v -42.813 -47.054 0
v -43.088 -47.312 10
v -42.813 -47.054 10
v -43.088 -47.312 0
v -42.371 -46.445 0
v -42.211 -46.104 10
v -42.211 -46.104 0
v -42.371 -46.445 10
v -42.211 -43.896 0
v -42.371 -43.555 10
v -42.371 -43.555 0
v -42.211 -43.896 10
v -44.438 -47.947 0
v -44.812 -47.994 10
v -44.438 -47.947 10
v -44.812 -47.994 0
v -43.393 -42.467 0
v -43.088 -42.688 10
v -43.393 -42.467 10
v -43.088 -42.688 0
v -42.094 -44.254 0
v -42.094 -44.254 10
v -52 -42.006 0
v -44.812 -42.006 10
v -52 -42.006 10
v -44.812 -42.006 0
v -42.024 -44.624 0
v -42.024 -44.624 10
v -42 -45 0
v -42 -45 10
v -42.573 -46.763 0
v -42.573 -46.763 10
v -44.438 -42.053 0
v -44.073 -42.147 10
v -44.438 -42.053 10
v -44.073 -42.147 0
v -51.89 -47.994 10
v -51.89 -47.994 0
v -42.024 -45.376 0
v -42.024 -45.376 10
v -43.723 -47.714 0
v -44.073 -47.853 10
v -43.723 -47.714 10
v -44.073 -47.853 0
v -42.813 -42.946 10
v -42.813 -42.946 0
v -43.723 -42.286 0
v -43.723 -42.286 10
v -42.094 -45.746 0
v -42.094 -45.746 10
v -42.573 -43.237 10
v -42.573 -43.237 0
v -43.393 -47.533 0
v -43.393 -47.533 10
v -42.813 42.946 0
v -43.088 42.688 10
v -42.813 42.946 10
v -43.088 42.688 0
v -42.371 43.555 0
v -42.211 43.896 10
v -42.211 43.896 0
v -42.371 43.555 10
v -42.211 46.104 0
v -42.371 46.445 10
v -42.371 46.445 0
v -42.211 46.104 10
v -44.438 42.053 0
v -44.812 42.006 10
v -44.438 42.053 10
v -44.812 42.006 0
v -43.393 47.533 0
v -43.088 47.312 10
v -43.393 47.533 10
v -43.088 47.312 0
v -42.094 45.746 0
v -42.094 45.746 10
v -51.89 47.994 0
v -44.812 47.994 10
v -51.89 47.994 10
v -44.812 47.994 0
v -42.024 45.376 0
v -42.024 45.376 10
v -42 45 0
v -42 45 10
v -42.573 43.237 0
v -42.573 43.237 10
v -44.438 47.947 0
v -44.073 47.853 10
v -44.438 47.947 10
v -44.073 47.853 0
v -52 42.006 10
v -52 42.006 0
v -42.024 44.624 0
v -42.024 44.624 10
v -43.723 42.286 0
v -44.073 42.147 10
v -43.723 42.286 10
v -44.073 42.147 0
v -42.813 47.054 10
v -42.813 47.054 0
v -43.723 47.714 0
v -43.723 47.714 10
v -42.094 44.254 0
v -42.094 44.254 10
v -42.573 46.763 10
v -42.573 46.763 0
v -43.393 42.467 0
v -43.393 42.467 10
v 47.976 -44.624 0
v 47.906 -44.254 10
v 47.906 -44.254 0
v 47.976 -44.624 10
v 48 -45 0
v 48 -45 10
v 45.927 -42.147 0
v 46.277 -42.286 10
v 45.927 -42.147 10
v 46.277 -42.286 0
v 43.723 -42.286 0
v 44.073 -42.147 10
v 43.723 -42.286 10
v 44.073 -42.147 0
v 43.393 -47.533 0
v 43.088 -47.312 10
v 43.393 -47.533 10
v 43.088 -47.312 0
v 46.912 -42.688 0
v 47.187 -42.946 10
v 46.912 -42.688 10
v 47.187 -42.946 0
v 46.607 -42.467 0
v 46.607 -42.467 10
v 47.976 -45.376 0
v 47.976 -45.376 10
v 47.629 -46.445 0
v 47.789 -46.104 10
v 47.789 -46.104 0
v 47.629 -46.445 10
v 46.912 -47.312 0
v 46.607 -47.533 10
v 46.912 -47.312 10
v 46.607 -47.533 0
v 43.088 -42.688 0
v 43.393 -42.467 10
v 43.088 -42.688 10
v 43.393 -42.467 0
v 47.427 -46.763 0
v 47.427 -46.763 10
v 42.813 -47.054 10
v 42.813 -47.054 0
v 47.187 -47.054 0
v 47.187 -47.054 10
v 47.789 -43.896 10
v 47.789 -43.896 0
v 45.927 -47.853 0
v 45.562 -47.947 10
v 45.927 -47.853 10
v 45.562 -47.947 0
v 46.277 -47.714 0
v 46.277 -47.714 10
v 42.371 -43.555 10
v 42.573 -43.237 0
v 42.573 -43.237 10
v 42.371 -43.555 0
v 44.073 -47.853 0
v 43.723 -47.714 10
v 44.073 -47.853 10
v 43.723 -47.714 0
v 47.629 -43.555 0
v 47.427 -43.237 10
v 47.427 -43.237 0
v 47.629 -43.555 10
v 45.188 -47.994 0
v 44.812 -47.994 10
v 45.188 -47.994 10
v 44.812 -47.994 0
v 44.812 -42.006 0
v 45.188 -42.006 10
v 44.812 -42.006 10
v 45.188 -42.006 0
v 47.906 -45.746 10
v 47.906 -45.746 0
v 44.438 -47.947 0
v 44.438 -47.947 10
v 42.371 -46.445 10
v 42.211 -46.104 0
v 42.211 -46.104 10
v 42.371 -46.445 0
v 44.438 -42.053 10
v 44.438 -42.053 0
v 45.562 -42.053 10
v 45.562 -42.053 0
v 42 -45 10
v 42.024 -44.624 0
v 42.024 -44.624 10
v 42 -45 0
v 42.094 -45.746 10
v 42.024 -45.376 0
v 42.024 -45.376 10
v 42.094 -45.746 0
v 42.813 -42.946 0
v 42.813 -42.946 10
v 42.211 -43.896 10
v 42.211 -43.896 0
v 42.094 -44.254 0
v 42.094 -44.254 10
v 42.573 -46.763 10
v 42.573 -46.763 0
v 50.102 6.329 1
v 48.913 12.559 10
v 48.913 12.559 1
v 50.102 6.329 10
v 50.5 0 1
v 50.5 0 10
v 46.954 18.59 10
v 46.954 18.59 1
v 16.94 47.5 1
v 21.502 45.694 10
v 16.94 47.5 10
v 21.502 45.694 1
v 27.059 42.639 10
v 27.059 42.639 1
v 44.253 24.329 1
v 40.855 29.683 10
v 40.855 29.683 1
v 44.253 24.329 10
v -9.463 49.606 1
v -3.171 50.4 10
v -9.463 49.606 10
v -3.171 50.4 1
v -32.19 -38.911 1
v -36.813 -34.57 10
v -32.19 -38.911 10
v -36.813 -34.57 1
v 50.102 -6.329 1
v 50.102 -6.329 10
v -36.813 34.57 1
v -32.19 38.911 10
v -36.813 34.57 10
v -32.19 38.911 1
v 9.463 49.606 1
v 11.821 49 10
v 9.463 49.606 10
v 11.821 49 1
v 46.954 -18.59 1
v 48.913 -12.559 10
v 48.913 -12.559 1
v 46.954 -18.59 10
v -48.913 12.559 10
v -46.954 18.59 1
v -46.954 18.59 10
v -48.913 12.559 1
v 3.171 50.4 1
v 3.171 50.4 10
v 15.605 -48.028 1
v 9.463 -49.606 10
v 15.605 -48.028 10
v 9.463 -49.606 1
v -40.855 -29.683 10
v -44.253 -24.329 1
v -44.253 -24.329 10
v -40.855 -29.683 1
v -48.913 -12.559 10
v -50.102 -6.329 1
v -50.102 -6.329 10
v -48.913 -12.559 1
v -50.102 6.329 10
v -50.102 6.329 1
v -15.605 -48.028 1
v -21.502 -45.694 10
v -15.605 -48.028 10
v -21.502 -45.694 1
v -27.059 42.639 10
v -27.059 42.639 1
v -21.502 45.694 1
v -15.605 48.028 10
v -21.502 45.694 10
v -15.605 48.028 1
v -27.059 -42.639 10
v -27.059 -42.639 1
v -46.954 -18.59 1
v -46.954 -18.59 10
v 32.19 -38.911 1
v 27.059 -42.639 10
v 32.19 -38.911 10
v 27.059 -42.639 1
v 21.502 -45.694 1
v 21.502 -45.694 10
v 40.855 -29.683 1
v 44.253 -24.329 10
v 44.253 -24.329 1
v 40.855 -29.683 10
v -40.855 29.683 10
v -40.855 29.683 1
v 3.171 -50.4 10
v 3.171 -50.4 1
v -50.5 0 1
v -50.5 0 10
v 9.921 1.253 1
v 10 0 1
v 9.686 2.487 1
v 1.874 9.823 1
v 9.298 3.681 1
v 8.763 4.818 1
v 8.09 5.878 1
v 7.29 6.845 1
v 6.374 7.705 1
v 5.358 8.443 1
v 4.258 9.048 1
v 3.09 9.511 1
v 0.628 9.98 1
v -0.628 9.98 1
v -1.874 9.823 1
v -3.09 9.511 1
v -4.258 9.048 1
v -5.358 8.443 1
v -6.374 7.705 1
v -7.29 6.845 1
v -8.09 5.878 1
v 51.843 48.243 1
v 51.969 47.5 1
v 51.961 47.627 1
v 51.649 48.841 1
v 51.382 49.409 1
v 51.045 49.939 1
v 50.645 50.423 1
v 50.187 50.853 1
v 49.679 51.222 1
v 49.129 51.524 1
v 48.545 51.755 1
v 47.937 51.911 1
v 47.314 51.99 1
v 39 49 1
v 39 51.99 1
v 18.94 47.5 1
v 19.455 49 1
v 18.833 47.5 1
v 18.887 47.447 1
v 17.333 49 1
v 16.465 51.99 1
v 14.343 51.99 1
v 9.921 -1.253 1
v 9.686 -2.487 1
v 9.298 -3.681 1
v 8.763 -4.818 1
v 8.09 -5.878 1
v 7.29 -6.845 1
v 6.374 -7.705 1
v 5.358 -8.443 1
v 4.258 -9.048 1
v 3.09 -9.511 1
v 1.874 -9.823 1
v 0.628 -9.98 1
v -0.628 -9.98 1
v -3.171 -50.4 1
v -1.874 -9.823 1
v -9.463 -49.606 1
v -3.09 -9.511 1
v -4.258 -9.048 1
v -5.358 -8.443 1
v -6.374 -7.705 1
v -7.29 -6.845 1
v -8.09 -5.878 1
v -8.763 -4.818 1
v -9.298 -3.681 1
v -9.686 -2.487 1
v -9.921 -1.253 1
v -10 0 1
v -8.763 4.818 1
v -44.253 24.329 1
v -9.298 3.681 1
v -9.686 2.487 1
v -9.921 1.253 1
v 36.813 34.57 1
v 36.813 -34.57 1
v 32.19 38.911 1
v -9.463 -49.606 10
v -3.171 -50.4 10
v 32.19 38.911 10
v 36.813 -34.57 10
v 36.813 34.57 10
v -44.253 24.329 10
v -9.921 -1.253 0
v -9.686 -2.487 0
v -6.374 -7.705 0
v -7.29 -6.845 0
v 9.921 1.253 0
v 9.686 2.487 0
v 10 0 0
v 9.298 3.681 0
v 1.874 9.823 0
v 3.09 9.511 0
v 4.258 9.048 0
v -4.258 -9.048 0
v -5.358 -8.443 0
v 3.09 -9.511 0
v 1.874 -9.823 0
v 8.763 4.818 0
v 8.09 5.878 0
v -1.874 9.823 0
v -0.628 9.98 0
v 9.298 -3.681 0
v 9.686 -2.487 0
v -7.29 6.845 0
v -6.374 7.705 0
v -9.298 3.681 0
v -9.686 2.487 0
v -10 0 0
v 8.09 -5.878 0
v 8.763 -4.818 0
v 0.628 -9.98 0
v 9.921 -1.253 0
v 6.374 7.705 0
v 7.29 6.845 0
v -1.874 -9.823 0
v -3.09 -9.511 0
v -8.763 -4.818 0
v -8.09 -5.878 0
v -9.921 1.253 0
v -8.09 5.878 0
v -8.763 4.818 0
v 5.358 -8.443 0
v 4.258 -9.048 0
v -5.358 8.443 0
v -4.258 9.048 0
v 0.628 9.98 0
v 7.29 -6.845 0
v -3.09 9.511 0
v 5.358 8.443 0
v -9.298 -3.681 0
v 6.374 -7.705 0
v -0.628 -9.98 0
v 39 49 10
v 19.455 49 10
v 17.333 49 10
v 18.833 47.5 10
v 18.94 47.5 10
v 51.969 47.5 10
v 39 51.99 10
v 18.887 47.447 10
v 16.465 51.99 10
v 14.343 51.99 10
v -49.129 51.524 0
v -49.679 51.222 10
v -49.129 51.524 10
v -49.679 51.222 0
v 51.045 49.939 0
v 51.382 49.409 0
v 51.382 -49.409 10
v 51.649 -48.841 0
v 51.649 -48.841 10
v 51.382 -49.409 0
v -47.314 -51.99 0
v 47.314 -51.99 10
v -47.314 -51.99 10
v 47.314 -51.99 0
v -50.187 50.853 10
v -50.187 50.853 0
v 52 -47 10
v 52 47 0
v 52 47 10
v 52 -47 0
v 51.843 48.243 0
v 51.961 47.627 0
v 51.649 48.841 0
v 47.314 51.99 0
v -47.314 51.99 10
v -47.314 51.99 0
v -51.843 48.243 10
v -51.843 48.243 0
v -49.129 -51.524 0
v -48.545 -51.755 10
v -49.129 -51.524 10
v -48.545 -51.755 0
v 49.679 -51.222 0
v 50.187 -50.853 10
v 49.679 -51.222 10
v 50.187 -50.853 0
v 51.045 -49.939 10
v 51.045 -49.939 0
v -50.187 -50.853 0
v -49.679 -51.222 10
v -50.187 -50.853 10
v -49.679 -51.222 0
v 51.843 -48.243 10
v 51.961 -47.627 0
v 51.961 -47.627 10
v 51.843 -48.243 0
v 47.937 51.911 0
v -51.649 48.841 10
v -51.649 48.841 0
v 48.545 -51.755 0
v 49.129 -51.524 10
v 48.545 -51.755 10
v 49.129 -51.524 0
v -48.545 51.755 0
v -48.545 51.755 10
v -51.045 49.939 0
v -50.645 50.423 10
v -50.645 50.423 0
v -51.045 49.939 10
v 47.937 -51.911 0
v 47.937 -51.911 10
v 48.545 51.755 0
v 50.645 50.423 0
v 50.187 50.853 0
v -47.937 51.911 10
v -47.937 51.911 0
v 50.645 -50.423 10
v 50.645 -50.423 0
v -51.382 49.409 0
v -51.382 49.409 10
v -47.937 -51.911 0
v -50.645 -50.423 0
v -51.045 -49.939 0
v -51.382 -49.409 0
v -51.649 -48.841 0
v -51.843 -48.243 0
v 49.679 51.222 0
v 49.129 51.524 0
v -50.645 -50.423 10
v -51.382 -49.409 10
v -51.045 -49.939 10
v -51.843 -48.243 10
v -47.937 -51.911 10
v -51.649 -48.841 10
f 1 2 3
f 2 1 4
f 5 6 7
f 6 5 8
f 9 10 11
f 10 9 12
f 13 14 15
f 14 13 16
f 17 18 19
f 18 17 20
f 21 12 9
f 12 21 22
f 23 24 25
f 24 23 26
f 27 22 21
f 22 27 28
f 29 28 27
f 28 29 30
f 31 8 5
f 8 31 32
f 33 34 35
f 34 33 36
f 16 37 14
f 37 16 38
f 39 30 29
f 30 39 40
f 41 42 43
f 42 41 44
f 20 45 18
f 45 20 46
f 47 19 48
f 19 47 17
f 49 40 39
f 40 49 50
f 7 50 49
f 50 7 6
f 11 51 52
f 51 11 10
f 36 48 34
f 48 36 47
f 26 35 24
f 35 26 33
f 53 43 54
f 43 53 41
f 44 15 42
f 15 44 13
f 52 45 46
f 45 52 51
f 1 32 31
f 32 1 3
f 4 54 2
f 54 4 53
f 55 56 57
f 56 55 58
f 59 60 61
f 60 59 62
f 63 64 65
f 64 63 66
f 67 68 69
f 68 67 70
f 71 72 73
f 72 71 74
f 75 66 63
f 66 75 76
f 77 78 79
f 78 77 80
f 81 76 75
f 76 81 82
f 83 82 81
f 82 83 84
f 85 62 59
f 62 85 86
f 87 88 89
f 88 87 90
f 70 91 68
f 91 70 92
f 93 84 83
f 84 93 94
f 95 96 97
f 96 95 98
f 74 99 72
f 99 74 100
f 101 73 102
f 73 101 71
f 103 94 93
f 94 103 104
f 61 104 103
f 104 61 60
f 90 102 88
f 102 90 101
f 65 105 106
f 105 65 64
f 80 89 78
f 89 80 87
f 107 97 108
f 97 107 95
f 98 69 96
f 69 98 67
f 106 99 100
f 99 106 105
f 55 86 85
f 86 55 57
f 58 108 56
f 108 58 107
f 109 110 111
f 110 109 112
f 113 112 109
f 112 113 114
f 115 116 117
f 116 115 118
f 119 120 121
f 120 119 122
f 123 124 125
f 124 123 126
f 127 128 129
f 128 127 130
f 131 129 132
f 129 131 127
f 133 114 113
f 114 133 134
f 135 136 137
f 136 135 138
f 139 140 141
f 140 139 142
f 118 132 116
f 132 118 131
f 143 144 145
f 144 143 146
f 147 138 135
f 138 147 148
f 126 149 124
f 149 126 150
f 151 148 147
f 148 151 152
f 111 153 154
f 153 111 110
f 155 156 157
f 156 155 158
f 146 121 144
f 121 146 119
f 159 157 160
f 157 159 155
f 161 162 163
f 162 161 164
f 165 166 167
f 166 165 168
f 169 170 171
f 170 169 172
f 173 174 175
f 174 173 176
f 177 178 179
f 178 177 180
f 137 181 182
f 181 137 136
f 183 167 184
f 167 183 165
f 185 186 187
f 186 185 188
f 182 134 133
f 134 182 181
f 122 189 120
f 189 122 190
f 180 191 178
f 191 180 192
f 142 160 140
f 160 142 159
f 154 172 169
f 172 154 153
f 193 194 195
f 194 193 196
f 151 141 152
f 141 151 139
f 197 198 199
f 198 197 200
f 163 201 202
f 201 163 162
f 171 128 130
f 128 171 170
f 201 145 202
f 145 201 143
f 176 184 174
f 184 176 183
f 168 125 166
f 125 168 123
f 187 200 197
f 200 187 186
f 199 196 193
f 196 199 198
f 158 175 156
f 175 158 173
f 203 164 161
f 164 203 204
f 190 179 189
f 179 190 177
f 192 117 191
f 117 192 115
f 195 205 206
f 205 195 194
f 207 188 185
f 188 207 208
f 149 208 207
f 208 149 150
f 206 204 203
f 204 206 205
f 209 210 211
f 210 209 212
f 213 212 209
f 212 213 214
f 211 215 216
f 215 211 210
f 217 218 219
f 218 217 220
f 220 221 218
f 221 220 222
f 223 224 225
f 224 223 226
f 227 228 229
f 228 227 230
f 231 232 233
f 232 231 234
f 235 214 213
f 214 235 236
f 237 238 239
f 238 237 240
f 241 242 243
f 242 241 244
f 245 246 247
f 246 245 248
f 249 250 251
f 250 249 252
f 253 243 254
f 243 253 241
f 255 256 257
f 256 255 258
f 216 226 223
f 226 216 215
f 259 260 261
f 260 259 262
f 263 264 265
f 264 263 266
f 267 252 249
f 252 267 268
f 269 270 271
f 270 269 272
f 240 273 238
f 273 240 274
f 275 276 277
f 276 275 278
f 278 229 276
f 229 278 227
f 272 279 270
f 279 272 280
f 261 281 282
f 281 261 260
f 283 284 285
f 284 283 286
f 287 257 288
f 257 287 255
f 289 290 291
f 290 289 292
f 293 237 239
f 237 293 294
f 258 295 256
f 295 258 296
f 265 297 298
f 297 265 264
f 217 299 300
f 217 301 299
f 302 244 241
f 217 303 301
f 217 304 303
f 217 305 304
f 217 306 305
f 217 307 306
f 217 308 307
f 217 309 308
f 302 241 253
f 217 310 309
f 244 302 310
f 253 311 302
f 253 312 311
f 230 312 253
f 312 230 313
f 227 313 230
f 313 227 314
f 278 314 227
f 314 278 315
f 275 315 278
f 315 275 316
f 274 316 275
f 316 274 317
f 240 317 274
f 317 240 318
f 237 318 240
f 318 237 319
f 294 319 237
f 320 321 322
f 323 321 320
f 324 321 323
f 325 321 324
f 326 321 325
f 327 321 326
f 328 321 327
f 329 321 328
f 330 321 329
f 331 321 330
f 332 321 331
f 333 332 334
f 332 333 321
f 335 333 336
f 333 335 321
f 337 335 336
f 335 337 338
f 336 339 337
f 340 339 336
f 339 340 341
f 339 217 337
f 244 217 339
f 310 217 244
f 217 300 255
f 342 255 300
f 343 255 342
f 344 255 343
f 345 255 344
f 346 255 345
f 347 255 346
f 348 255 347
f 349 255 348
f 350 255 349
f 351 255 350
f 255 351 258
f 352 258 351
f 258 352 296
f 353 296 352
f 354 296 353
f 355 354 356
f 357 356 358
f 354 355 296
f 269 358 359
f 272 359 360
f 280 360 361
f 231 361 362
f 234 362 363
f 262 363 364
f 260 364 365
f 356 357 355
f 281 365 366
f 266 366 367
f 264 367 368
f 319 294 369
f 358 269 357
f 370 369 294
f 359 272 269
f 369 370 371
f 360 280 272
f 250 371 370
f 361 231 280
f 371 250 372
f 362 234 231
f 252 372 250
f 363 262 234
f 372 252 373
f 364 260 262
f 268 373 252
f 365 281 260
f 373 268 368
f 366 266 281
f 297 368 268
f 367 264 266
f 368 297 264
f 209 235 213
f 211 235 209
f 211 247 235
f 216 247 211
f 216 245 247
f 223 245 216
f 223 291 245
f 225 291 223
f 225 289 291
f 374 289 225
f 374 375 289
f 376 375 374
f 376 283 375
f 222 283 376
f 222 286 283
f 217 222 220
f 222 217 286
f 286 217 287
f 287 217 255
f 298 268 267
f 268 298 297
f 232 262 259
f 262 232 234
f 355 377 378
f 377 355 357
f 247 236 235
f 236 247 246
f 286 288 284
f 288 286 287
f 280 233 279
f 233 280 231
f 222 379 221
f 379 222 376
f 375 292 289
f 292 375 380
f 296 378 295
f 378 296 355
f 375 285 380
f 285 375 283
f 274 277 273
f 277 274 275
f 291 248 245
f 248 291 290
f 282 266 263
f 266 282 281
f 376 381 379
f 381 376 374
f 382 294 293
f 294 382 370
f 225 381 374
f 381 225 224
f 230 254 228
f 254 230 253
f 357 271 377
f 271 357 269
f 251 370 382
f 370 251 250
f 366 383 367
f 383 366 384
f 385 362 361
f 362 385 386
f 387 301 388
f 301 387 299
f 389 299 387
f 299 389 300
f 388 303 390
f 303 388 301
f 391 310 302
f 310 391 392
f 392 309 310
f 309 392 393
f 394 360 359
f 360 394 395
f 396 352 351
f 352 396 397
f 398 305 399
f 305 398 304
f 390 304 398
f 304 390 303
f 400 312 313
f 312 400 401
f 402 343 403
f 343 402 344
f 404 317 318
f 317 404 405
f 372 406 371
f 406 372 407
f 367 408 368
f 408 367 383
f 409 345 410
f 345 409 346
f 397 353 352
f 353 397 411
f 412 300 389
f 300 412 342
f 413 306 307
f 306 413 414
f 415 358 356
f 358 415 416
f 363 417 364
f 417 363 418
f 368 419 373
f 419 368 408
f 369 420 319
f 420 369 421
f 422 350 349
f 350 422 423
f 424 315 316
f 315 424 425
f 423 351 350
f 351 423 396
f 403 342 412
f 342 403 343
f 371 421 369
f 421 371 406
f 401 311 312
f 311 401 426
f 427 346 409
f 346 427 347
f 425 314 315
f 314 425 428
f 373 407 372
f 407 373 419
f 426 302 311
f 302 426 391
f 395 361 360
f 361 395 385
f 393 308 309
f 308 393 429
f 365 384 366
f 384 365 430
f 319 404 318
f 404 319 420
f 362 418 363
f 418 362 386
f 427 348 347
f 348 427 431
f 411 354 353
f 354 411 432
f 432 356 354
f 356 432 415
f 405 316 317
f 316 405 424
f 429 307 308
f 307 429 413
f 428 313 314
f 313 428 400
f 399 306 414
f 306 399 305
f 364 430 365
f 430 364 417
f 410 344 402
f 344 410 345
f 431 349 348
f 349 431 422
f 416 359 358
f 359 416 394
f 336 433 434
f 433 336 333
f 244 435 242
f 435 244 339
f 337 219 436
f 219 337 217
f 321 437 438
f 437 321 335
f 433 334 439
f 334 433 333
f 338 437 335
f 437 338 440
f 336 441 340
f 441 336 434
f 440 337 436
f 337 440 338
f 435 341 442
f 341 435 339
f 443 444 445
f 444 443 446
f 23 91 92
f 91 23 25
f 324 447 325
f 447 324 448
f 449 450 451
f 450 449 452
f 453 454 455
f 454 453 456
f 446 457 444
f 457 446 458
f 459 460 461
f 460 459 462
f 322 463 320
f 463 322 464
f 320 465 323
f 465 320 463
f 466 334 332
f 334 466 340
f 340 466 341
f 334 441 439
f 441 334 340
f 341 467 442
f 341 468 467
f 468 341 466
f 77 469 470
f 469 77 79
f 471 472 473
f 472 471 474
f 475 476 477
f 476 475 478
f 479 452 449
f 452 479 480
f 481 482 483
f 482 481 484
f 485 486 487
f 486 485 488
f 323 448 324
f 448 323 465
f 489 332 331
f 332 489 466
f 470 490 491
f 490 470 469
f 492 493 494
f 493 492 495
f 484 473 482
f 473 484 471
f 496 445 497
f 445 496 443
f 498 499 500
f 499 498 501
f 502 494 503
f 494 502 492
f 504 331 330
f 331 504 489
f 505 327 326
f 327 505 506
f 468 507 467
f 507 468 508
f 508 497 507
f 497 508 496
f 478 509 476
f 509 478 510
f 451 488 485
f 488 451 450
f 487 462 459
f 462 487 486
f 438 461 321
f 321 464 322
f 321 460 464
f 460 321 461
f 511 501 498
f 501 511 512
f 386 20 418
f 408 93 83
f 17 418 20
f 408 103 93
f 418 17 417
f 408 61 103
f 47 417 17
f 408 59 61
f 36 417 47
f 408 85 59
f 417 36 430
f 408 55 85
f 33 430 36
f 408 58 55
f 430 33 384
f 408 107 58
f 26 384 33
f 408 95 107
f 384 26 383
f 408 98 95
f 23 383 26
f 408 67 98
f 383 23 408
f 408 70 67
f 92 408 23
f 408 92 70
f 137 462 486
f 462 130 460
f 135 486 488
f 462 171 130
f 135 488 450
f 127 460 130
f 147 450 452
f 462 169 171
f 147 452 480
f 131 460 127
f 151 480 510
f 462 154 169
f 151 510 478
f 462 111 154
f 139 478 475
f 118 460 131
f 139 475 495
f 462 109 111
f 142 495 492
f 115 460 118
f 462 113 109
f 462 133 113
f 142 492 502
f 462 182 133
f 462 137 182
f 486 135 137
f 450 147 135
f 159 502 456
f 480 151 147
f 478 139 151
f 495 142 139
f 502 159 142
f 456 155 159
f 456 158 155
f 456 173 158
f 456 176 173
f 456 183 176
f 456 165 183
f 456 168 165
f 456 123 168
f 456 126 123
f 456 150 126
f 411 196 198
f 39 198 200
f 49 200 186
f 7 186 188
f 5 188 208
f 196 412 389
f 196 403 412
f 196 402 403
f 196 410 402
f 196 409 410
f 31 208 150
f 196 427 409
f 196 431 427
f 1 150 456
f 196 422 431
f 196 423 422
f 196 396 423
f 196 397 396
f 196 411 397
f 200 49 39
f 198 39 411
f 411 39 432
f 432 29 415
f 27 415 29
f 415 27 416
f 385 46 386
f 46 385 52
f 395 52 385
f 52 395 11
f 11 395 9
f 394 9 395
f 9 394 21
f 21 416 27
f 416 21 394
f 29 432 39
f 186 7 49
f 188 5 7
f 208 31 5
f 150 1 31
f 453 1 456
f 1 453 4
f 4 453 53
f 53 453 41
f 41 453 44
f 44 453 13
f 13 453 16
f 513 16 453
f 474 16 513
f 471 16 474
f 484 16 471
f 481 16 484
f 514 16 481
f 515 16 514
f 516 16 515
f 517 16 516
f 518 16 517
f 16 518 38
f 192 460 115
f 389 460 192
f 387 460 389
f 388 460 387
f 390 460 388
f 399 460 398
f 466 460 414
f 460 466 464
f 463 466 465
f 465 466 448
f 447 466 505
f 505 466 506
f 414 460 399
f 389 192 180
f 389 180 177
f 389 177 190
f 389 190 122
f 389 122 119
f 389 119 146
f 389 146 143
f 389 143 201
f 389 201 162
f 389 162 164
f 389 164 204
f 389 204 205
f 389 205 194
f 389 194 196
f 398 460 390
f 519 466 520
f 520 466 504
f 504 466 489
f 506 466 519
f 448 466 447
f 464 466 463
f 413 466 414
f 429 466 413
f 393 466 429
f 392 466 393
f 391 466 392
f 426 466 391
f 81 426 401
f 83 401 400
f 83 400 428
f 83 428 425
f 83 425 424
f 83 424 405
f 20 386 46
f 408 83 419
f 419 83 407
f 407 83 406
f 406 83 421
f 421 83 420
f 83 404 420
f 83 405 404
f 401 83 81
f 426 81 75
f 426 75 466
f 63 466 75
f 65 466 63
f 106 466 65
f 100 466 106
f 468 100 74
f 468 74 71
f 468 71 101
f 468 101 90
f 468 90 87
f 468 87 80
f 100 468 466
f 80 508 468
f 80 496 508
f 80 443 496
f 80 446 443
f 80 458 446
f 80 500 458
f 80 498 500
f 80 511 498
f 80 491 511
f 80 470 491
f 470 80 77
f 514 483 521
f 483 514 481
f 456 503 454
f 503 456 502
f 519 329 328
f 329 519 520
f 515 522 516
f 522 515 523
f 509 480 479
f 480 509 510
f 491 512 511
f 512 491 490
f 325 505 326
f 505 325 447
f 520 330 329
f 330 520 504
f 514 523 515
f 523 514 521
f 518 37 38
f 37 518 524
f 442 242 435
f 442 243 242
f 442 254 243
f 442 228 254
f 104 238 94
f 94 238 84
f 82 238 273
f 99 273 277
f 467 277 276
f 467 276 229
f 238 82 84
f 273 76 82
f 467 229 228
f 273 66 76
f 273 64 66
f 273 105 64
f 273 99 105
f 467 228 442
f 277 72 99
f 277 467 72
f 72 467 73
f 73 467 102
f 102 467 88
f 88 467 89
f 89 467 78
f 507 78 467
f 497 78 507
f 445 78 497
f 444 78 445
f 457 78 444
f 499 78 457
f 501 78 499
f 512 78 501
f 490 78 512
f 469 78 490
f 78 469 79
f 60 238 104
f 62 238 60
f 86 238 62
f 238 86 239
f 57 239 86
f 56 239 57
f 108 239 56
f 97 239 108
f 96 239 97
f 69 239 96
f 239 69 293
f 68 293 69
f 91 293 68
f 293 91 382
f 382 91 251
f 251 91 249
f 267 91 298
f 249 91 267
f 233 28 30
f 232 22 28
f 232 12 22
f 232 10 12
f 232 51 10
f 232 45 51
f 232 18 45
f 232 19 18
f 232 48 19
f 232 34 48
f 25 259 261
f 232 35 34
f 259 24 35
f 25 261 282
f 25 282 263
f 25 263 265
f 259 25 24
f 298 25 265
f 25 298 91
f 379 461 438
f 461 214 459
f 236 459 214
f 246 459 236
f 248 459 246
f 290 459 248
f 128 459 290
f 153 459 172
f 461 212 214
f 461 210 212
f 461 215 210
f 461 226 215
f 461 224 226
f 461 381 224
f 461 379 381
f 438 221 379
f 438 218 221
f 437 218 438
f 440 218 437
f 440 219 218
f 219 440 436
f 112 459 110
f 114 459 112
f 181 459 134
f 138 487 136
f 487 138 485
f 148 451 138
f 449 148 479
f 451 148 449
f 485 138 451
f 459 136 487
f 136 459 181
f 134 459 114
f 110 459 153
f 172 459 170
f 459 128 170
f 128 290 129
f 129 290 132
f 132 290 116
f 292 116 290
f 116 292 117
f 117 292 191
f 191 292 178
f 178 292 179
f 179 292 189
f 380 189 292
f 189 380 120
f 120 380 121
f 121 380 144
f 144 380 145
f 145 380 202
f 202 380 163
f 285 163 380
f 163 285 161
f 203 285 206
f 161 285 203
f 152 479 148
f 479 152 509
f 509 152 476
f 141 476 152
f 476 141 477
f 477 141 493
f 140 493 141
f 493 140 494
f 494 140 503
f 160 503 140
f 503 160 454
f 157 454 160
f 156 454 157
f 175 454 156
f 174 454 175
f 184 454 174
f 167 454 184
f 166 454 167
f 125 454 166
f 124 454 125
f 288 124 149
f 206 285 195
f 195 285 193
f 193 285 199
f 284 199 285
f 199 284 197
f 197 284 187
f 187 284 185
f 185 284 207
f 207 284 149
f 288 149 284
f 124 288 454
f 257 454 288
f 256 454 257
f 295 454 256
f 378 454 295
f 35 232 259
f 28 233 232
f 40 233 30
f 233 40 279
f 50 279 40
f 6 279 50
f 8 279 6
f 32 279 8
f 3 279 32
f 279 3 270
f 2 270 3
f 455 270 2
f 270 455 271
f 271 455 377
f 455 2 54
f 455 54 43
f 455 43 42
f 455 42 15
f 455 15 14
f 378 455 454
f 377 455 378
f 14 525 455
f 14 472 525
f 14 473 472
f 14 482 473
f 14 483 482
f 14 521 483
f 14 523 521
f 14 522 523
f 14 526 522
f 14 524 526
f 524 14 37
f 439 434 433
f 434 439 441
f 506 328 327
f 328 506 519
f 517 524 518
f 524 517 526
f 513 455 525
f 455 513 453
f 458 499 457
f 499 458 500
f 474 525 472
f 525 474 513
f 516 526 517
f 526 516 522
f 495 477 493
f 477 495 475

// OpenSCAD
$fn = 50;


difference() {
	union() {
		translate(v = [0, 0, 0]) {
			rotate(a = [0, 0, 0]) {
				hull() {
					translate(v = [-47.0000000000, 47.0000000000, 0]) {
						rotate(a = [0, 0, 0]) {
							translate(v = [0, 0, 0]) {
								rotate(a = [0, 0, 0]) {
									cylinder(h = 10, r = 5);
								}
							}
						}
					}
					translate(v = [47.0000000000, 47.0000000000, 0]) {
						rotate(a = [0, 0, 0]) {
							translate(v = [0, 0, 0]) {
								rotate(a = [0, 0, 0]) {
									cylinder(h = 10, r = 5);
								}
							}
						}
					}
					translate(v = [-47.0000000000, -47.0000000000, 0]) {
						rotate(a = [0, 0, 0]) {
							translate(v = [0, 0, 0]) {
								rotate(a = [0, 0, 0]) {
									cylinder(h = 10, r = 5);
								}
							}
						}
					}
					translate(v = [47.0000000000, -47.0000000000, 0]) {
						rotate(a = [0, 0, 0]) {
							translate(v = [0, 0, 0]) {
								rotate(a = [0, 0, 0]) {
									cylinder(h = 10, r = 5);
								}
							}
						}
					}
				}
			}
		}
	}
	union() {
		translate(v = [-52.5000000000, -45.0000000000, -125]) {
			rotate(a = [0, 0, 0]) {
				hull() {
					translate(v = [7.5000000000, 0, 0]) {
						rotate(a = [0, 0, 0]) {
							translate(v = [0, 0, 0]) {
								rotate(a = [0, 0, 0]) {
									cylinder(h = 250, r = 3.0000000000);
								}
							}
						}
					}
					translate(v = [-7.5000000000, 0, 0]) {
						rotate(a = [0, 0, 0]) {
							translate(v = [0, 0, 0]) {
								rotate(a = [0, 0, 0]) {
									cylinder(h = 250, r = 3.0000000000);
								}
							}
						}
					}
				}
			}
		}
		translate(v = [-52.5000000000, 45.0000000000, -125]) {
			rotate(a = [0, 0, 0]) {
				hull() {
					translate(v = [7.5000000000, 0, 0]) {
						rotate(a = [0, 0, 0]) {
							translate(v = [0, 0, 0]) {
								rotate(a = [0, 0, 0]) {
									cylinder(h = 250, r = 3.0000000000);
								}
							}
						}
					}
					translate(v = [-7.5000000000, 0, 0]) {
						rotate(a = [0, 0, 0]) {
							translate(v = [0, 0, 0]) {
								rotate(a = [0, 0, 0]) {
									cylinder(h = 250, r = 3.0000000000);
								}
							}
						}
					}
				}
			}
		}
		translate(v = [45.0000000000, -45.0000000000, -125.0000000000]) {
			rotate(a = [0, 0, 0]) {
				cylinder(h = 250, r = 3.0000000000);
			}
		}
		translate(v = [0, 0, 1.0000000000]) {
			rotate(a = [0, 0, 0]) {
				cylinder(h = 12, r = 50.5000000000);
			}
		}
		translate(v = [0, 0, -5.0000000000]) {
			rotate(a = [0, 0, 0]) {
				cylinder(h = 10, r = 10.0000000000);
			}
		}
		translate(v = [0.0000000000, 47.5000000000, 1]) {
			rotate(a = [0, 0, 0]) {
				cube(size = [52.0000000000, 1.5000000000, 12]);
			}
		}
		translate(v = [39.0000000000, 47.5000000000, 1]) {
			rotate(a = [0, 0, 0]) {
				cube(size = [13.0000000000, 4.5000000000, 12]);
			}
		}
		translate(v = [13.5833333333, 52.7500000000, 1]) {
			rotate(a = [0, 0, -45]) {
				cube(size = [7.5000000000, 1.5000000000, 12]);
			}
		}
	}
}
